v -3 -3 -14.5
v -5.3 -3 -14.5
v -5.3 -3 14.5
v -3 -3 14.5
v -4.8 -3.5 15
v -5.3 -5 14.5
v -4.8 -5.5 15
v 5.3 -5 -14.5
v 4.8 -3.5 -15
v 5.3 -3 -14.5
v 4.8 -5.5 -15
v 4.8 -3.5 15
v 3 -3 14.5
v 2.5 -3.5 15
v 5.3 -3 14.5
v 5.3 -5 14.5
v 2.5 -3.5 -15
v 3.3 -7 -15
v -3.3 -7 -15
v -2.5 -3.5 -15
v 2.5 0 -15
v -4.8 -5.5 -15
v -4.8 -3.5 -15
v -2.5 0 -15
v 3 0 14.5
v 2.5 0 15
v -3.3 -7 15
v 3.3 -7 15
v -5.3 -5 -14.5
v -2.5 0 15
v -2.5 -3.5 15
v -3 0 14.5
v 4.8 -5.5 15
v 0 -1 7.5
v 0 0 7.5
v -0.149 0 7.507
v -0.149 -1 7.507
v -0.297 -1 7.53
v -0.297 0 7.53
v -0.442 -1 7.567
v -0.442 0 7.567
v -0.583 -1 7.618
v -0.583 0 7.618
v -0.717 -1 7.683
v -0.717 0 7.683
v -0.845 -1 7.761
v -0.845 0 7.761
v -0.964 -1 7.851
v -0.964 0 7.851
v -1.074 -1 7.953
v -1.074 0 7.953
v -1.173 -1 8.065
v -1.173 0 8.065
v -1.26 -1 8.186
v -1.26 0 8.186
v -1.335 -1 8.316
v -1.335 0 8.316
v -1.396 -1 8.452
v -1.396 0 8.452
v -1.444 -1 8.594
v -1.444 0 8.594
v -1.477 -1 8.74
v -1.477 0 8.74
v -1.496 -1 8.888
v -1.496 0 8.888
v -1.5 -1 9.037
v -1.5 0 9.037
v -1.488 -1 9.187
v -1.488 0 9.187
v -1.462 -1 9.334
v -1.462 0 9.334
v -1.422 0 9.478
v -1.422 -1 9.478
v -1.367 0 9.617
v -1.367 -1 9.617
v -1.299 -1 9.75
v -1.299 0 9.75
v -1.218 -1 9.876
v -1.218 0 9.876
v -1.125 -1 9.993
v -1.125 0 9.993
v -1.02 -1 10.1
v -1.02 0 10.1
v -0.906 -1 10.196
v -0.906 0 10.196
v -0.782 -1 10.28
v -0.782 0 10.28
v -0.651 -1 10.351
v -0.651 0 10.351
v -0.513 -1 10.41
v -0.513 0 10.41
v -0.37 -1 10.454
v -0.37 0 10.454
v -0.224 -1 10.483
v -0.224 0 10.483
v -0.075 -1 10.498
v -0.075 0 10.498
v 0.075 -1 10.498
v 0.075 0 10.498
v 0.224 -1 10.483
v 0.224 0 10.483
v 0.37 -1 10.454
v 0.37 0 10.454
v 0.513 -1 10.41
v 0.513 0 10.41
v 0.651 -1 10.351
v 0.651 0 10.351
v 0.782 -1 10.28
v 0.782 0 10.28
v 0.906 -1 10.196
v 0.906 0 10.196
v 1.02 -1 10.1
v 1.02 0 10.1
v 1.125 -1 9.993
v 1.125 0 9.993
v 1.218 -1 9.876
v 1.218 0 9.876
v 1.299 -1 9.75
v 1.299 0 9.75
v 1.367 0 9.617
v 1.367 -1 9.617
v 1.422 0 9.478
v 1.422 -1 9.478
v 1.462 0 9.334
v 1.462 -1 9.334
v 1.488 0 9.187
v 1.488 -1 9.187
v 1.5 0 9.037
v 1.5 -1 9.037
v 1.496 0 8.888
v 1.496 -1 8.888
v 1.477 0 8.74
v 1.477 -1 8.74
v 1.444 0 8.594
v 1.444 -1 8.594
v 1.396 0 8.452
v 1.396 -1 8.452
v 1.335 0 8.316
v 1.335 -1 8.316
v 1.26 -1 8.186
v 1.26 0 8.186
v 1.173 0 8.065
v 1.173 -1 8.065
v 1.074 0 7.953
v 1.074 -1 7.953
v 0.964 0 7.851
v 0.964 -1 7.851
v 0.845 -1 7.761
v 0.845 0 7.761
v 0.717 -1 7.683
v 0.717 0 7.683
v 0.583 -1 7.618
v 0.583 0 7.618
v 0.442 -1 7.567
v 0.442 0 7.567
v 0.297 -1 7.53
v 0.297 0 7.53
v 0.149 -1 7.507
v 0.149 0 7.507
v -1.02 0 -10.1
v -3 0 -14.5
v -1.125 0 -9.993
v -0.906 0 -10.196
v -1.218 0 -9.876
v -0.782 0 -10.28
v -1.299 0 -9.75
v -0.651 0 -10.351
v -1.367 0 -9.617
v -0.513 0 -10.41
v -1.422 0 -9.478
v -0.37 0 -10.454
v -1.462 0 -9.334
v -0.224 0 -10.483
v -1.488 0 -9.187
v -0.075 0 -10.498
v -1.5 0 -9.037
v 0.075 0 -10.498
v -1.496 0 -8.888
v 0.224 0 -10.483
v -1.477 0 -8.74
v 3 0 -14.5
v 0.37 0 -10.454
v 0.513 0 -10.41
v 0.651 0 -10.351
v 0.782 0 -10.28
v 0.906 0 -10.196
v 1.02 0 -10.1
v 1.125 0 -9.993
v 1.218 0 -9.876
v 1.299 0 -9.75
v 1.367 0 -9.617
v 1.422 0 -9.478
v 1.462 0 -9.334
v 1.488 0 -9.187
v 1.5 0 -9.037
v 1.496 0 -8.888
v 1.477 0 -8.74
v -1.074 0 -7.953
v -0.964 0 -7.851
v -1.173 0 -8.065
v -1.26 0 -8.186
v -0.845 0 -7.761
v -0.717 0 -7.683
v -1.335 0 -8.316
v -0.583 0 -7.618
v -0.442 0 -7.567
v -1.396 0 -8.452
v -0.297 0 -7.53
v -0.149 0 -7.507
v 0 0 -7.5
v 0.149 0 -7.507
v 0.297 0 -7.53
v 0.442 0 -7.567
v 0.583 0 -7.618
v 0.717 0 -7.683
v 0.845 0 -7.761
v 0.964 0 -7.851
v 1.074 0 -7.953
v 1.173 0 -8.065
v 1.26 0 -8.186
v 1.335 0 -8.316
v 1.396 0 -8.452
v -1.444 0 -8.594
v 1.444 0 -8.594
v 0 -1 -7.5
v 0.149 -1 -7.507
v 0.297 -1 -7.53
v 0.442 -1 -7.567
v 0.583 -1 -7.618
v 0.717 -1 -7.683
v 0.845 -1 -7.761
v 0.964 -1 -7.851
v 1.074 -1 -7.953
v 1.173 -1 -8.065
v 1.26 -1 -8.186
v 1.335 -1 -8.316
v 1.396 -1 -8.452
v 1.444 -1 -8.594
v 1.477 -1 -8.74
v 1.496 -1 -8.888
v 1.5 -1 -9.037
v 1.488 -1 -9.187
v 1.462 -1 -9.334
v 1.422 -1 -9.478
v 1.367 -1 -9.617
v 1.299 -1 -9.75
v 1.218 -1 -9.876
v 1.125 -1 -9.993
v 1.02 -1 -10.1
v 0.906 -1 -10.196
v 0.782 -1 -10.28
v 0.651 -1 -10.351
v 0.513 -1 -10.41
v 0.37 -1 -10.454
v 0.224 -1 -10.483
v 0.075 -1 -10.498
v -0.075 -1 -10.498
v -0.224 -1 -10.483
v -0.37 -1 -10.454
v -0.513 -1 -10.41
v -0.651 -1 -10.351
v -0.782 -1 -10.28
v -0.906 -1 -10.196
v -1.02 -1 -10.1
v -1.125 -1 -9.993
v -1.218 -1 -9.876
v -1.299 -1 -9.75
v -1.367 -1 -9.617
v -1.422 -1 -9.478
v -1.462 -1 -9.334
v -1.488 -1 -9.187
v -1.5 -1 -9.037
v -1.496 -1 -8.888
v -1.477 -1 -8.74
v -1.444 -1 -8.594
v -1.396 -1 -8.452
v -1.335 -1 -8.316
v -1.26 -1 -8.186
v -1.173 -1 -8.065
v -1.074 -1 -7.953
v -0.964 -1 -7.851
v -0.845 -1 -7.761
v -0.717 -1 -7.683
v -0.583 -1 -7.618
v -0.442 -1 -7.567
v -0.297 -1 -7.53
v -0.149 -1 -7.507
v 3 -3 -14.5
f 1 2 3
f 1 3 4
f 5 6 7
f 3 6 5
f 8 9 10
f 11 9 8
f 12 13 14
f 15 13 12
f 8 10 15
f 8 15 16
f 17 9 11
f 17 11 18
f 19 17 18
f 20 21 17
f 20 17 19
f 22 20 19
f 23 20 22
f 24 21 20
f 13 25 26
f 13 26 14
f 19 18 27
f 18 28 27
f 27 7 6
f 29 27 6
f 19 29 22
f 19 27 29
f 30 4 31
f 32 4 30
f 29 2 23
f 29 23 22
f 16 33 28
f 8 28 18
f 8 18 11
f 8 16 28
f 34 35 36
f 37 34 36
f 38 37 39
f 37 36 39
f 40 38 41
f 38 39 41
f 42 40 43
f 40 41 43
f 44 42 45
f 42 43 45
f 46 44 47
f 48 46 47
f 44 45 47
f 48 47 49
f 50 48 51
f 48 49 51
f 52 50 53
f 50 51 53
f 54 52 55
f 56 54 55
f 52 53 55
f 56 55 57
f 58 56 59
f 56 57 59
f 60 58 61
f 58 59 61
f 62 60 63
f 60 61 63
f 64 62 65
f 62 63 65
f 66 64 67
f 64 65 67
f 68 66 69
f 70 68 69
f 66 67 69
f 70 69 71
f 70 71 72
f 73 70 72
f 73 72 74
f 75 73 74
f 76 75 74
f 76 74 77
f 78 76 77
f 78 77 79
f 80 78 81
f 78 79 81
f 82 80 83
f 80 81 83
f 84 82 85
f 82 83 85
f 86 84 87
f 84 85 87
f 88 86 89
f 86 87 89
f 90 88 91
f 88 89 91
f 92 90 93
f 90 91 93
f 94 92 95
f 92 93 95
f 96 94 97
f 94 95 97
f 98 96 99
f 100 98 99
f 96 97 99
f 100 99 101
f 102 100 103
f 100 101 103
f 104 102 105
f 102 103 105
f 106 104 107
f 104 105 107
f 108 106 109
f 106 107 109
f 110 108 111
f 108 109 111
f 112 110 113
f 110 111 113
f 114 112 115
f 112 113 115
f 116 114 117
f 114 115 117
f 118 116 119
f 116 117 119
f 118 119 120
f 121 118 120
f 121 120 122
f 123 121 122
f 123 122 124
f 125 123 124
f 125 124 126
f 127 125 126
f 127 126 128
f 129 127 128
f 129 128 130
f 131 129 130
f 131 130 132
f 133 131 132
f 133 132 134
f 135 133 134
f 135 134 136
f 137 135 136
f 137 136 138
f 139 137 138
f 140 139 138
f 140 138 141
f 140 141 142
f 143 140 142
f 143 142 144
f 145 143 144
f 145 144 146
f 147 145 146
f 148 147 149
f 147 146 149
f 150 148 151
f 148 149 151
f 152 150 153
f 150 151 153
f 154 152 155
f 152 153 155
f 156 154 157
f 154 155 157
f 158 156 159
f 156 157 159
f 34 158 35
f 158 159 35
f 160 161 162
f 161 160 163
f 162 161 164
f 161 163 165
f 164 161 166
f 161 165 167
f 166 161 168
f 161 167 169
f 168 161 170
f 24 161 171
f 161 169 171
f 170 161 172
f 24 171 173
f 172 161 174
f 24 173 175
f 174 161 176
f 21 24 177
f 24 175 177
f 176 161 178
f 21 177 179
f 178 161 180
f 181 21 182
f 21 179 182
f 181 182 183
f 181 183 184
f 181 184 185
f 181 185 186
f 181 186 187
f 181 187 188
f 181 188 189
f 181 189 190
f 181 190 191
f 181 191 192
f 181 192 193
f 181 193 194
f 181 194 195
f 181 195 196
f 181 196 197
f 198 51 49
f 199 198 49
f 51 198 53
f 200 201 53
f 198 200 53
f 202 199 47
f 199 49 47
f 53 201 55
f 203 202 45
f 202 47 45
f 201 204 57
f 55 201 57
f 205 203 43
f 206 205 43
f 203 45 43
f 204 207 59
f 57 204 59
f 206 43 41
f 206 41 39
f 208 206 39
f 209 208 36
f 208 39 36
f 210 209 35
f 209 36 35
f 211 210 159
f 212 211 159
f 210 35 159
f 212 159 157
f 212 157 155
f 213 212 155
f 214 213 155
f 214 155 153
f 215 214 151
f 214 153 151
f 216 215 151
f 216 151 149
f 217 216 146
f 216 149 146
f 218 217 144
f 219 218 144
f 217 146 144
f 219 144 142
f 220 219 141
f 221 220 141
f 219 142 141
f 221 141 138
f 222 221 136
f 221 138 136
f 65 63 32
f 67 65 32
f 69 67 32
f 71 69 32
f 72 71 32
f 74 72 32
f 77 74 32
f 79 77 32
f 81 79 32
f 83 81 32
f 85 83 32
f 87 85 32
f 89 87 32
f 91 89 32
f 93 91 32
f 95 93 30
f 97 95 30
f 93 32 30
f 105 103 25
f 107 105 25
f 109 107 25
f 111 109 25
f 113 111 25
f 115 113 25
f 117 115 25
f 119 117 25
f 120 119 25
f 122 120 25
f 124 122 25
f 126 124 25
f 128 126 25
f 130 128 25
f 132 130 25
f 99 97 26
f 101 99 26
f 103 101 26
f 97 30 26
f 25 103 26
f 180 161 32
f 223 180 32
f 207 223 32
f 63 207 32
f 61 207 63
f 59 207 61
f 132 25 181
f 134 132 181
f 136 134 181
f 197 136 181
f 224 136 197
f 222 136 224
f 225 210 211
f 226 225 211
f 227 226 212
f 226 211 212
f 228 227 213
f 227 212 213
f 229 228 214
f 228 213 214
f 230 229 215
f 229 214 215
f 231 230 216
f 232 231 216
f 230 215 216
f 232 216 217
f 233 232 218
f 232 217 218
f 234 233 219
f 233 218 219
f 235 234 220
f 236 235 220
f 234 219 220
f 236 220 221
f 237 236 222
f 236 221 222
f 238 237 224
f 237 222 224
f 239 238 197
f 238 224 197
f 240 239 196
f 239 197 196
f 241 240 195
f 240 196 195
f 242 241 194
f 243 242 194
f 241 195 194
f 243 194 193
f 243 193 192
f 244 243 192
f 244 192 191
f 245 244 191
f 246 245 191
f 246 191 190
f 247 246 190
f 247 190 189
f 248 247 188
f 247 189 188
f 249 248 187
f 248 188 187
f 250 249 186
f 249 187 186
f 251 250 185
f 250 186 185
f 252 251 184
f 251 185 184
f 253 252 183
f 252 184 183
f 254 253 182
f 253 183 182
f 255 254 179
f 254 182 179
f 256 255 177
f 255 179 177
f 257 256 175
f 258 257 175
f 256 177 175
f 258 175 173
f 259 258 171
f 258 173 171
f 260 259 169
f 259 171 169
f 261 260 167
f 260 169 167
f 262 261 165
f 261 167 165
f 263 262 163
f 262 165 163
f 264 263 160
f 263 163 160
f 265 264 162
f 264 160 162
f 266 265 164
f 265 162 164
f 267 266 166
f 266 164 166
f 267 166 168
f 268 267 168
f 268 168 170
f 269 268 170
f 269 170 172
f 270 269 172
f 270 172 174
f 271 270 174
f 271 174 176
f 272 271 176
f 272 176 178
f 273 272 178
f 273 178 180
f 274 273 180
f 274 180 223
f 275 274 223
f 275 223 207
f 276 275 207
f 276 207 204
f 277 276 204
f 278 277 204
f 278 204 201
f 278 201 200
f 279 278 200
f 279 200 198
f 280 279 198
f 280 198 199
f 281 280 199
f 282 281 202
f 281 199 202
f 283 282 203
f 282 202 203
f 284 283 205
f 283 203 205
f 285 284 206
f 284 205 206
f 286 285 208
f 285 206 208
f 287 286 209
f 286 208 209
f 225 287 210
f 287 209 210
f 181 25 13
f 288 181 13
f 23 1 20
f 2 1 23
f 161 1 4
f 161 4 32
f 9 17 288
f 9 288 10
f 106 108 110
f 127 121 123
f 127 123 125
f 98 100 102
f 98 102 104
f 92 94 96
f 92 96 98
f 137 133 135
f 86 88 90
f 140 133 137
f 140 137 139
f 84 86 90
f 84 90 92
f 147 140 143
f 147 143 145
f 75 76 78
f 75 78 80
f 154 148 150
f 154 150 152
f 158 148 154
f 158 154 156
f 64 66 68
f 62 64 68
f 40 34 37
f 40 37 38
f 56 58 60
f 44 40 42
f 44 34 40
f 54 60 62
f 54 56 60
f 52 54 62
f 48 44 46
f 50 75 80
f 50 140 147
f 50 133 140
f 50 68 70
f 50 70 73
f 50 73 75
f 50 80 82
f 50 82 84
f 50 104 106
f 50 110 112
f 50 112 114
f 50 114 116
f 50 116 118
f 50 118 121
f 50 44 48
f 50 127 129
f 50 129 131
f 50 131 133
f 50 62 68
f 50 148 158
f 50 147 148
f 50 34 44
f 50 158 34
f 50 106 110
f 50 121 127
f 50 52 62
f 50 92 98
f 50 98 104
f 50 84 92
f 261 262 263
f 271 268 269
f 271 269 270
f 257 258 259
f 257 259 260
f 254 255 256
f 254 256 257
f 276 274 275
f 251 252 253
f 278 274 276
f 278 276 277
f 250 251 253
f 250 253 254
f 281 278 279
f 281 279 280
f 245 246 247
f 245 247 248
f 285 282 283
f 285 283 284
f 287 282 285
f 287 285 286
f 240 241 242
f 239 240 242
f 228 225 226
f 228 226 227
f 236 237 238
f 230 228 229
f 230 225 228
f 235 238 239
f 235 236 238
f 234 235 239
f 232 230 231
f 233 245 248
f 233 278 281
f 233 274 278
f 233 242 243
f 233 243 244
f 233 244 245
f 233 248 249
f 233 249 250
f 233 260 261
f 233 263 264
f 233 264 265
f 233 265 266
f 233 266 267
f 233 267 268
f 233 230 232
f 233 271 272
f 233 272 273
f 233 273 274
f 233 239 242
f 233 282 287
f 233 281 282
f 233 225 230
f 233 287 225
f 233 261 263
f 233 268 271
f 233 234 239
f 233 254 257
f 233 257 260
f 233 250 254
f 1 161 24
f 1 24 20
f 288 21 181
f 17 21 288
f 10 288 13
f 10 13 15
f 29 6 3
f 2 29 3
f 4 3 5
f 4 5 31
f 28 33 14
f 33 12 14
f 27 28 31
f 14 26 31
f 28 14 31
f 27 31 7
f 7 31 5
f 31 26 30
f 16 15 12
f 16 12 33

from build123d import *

# Parameters (mm, degrees)
EXTRUDE_1_DEPTH     = 15
CHAMFER_1_SIZE      = 2
CHAMFER_2_SIZE      = 0.5
MIRROR_START        = -9.237604307
MIRROR_2_DEPTH      = 2.598076211
MIRROR_START_2      = 6.639528096
MIRROR_2_2_DEPTH    = 2.598076211
SKETCH_2_R          = 1.5
CUT_EXTRUDE_1_DEPTH = 1


# Read off the part's stored shape, not the designer's step: 镜向2
with BuildPart() as part:
    # 草图1 → 凸台-拉伸1 (new, symmetric)
    with BuildSketch(Plane.XY):
        Polygon((-3, 0), (3, 0), (3, -3), (5.3, -3), (5.3, -7), (-5.3, -7), (-5.3, -3), (-3, -3), align=None)
    extrude(amount=EXTRUDE_1_DEPTH, both=True)

    # 倒角1
    chamfer_1_edges = [part.edges().sort_by_distance(p)[0] for p in [
        (5.3, -7, 0),
        (-5.3, -7, 0),
    ]]
    chamfer(chamfer_1_edges, length=CHAMFER_1_SIZE)

    # 倒角2
    chamfer_2_edges = [part.edges().sort_by_distance(p)[0] for p in [
        (-3, -1.5, 15),
        (-4.15, -3, 15),
        (-5.3, -4, 15),
        (5.3, -4, 15),
        (4.15, -3, 15),
        (3, -1.5, 15),
    ]]
    chamfer(chamfer_2_edges, length=CHAMFER_2_SIZE)

    # 镜向2 outline → 镜向2 (cut)
    with BuildSketch(Plane(origin=(0, 0, 0), x_dir=(0.816496580927727, -0.4082482904638606, -0.4082482904638635), z_dir=(0.5773502691896244, 0.5773502691896244, 0.5773502691896285)).offset(MIRROR_START)):
        Polygon((9.593834826, 8.131727984), (11.471776962, 8.131727984), (12.288273543, 6.717514421), (13.279880956, 5), (14, 5), (14, 12), (7.360486936, 12), (8.164965809, 10.606601718), align=None)
    extrude(amount=MIRROR_2_DEPTH, mode=Mode.SUBTRACT)

    # Mirror 2 2 outline → Mirror 2 2 (cut)
    with BuildSketch(Plane(origin=(0, 0, 0), x_dir=(0.816496580927727, 0.4082482904638606, 0.4082482904638635), z_dir=(0.5773502691896244, -0.5773502691896244, -0.5773502691896285)).offset(MIRROR_START_2)):
        Polygon((-8.164965809, -10.606601718), (-9.593834826, -8.131727984), (-11.471776962, -8.131727984), (-12.288273543, -6.717514421), (-13.279880956, -5), (-14, -5), (-14, -12), (-7.360486936, -12), align=None)
    extrude(amount=MIRROR_2_2_DEPTH, mode=Mode.SUBTRACT)

    # 草图2 → 切除-拉伸1 (cut)
    with BuildSketch(Plane(origin=(0, 0, 0), x_dir=(1, 0, 0), z_dir=(0, 1, 0))):
        with Locations(Location((0, 9, 0), (0, 0, 270))):
            Circle(SKETCH_2_R)
        with Locations(Location((0, -9, 0), (0, 0, 90))):
            Circle(SKETCH_2_R)
    extrude(amount=-CUT_EXTRUDE_1_DEPTH, mode=Mode.SUBTRACT)


solid = part.part
